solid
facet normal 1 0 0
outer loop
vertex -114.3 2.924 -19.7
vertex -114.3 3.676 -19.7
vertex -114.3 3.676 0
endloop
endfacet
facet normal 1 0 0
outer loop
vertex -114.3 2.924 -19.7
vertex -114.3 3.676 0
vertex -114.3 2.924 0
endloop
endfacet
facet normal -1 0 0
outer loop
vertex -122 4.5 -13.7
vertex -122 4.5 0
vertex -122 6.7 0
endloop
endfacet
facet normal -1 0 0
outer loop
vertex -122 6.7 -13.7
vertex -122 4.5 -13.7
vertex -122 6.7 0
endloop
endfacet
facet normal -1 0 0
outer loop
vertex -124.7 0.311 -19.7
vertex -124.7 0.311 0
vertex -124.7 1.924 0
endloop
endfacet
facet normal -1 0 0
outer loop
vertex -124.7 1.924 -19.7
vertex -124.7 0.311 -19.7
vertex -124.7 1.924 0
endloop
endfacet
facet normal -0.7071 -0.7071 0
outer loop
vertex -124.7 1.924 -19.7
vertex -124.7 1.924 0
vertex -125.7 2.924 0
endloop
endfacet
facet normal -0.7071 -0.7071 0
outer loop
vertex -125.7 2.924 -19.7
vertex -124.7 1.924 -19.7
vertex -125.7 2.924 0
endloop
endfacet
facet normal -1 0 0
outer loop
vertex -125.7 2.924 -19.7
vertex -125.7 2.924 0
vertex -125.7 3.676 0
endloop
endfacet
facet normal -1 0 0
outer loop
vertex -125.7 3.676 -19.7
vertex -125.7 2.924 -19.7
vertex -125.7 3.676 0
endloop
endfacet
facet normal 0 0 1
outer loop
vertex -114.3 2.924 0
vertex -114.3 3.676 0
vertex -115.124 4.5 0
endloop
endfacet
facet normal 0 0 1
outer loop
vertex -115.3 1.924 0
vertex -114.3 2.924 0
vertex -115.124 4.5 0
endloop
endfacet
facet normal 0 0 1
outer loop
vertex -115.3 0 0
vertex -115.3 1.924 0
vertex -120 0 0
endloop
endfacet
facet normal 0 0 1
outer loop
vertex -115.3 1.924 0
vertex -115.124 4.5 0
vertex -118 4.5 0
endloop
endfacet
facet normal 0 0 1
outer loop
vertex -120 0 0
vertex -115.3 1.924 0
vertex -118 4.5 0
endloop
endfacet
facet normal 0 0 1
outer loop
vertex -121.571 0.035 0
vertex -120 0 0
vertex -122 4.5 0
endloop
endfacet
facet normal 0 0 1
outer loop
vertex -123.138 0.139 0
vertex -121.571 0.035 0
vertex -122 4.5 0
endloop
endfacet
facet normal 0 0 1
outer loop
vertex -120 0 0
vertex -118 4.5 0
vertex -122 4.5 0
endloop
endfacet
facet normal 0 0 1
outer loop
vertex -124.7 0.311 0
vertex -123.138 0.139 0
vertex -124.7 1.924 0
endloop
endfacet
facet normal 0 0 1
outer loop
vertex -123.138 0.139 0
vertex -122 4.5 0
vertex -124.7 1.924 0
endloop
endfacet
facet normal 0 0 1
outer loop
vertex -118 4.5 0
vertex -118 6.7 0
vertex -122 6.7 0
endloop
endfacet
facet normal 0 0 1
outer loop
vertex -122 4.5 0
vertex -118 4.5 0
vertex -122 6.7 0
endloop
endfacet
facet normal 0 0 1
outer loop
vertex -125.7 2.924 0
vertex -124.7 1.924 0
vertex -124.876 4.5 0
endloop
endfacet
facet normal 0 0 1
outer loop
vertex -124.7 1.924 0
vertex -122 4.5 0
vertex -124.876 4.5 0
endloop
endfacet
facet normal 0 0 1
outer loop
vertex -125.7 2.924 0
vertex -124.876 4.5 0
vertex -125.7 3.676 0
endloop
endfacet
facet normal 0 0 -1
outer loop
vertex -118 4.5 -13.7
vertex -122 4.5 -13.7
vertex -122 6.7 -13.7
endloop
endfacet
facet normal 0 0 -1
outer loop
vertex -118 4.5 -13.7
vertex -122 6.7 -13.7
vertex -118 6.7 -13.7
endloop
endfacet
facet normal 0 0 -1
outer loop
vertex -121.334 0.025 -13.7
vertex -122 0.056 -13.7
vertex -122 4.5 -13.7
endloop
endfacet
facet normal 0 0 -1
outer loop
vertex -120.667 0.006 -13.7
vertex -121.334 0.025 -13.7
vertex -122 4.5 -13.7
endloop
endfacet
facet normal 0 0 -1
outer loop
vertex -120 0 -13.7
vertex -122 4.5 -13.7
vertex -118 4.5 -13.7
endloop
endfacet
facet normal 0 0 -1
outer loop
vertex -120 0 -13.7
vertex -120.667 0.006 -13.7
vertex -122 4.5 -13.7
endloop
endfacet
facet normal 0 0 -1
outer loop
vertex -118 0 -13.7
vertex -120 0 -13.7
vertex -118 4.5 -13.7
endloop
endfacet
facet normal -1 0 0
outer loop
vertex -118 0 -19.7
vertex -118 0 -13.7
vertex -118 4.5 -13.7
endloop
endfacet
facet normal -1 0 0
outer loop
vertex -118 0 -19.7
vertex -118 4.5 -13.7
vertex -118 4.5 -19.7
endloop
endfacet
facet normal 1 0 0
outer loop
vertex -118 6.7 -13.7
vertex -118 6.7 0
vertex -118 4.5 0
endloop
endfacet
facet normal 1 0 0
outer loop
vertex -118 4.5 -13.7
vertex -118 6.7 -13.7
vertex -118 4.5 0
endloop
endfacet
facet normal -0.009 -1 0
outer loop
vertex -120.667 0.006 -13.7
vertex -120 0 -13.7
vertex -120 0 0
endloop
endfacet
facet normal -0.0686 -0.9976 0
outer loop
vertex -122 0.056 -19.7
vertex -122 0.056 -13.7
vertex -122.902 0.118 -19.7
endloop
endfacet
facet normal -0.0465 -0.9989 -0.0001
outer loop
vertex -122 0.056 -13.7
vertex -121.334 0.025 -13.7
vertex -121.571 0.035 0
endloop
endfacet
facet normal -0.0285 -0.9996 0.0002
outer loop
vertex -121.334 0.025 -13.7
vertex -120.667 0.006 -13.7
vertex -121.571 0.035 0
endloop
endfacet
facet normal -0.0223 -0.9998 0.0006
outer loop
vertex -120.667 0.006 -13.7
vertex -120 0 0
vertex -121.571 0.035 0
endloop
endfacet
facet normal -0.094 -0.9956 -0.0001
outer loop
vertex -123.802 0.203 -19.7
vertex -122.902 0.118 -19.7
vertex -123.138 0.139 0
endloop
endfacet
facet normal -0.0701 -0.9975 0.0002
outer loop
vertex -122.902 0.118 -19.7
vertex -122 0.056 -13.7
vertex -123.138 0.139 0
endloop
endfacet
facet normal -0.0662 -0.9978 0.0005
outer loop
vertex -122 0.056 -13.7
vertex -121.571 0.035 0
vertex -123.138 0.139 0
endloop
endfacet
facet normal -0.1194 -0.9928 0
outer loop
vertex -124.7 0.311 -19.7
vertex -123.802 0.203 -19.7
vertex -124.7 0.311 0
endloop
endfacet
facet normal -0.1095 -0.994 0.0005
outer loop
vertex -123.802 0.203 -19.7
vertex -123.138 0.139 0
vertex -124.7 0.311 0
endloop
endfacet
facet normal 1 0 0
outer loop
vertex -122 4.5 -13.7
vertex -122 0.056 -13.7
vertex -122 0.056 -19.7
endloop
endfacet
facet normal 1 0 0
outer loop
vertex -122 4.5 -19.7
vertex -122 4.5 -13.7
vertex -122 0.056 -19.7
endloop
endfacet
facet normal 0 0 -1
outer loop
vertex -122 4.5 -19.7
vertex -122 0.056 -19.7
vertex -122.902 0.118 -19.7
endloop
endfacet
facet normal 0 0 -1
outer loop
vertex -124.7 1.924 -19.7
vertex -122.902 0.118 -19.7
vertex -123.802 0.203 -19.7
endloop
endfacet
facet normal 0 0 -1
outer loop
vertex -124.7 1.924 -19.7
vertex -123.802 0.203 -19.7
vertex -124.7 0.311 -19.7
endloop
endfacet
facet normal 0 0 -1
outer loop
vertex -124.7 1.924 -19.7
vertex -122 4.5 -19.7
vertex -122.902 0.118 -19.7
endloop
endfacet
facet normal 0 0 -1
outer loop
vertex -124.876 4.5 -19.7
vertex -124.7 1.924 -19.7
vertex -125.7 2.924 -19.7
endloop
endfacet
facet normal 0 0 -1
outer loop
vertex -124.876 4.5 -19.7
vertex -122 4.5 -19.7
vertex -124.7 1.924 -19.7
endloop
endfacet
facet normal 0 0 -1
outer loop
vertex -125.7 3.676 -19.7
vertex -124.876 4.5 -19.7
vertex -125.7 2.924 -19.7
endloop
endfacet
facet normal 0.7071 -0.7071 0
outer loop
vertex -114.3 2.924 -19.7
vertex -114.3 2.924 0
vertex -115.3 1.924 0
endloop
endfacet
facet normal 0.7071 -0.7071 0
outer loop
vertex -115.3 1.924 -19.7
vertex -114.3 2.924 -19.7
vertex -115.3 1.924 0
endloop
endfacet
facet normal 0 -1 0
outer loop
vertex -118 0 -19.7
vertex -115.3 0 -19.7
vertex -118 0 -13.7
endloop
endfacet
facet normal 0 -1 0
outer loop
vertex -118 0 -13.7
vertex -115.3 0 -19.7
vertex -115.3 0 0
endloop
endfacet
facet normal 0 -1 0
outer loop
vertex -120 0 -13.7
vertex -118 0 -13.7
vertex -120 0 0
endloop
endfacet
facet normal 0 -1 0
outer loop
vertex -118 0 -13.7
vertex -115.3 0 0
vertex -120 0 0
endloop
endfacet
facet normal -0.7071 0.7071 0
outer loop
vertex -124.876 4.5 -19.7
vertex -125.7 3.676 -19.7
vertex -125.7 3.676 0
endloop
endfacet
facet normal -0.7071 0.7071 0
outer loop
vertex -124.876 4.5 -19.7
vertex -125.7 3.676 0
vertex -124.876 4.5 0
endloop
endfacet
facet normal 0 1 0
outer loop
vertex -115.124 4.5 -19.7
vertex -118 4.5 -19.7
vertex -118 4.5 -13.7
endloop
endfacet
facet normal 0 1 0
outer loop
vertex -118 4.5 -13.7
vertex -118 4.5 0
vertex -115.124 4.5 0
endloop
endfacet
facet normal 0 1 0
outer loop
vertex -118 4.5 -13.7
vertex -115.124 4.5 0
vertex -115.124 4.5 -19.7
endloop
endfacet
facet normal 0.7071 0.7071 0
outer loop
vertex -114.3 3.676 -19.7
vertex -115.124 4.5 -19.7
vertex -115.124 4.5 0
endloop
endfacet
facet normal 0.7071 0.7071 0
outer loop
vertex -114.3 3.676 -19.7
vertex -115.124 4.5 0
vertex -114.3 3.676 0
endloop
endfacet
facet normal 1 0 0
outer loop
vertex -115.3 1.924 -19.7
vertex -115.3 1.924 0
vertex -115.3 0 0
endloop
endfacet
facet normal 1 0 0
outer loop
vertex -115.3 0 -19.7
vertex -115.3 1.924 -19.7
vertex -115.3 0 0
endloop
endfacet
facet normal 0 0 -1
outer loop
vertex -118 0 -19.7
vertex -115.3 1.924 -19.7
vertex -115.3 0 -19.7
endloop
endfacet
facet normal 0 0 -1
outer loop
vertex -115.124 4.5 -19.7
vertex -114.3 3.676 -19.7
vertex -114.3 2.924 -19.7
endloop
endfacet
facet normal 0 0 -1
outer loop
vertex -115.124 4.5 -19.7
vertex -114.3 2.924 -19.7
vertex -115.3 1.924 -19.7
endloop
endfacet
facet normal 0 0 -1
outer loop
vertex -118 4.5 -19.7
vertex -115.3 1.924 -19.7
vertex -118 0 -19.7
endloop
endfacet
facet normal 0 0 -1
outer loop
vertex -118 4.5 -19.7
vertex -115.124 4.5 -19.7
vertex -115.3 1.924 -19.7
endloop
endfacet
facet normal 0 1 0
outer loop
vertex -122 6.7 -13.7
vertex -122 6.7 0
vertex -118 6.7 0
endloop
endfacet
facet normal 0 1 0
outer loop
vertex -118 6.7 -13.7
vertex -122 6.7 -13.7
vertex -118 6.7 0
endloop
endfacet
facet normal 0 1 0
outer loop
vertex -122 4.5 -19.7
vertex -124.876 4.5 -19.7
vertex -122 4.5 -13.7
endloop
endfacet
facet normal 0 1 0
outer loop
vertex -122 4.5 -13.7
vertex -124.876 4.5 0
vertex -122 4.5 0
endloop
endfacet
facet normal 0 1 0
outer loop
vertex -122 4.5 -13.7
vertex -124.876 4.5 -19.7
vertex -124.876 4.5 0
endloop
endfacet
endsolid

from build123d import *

# Parameters (mm, degrees)
BOSS_EXTRUDE1_DEPTH     = 19.7
CUT_EXTRUDE1_DEPTH      = 128.410635349
CUT_EXTRUDE1_DEPTH_BACK = 128.410635349
SKETCH2_W               = 4
SKETCH2_H               = 6


with BuildPart() as part:
    # Sketch1 → Boss-Extrude1 (new body)
    with BuildSketch(Plane.XY):
        with BuildLine():
            Line((-115.3, 0), (-120, 0))
            ThreePointArc((-120, 0), (-122.355151556, 0.077929384), (-124.7, 0.311376618))
            Line((-124.7, 0.311376618), (-124.7, 1.924264069))
            Line((-124.7, 1.924264069), (-125.7, 2.924264069))
            Line((-125.7, 2.924264069), (-125.7, 3.675735931))
            Line((-125.7, 3.675735931), (-124.875735931, 4.5))
            Line((-124.875735931, 4.5), (-122, 4.5))
            Line((-122, 4.5), (-122, 6.7))
            Line((-122, 6.7), (-118, 6.7))
            Line((-118, 6.7), (-118, 4.5))
            Line((-118, 4.5), (-115.124264069, 4.5))
            Line((-115.124264069, 4.5), (-114.3, 3.675735931))
            Line((-114.3, 3.675735931), (-114.3, 2.924264069))
            Line((-114.3, 2.924264069), (-115.3, 1.924264069))
            Line((-115.3, 1.924264069), (-115.3, 0))
        make_face()
    extrude(amount=-BOSS_EXTRUDE1_DEPTH)

    # Sketch2 → Cut-Extrude1 (cut, two sides: drawn at the far end of the back side and taken through both)
    with BuildSketch(Plane(origin=(0, 6.7, 0), x_dir=(1, 0, 0), z_dir=(0, 1, 0)).offset(-CUT_EXTRUDE1_DEPTH_BACK)):
        with Locations((-120, 16.7)):
            Rectangle(SKETCH2_W, SKETCH2_H)
    extrude(amount=CUT_EXTRUDE1_DEPTH + CUT_EXTRUDE1_DEPTH_BACK, mode=Mode.SUBTRACT)


solid = part.part
